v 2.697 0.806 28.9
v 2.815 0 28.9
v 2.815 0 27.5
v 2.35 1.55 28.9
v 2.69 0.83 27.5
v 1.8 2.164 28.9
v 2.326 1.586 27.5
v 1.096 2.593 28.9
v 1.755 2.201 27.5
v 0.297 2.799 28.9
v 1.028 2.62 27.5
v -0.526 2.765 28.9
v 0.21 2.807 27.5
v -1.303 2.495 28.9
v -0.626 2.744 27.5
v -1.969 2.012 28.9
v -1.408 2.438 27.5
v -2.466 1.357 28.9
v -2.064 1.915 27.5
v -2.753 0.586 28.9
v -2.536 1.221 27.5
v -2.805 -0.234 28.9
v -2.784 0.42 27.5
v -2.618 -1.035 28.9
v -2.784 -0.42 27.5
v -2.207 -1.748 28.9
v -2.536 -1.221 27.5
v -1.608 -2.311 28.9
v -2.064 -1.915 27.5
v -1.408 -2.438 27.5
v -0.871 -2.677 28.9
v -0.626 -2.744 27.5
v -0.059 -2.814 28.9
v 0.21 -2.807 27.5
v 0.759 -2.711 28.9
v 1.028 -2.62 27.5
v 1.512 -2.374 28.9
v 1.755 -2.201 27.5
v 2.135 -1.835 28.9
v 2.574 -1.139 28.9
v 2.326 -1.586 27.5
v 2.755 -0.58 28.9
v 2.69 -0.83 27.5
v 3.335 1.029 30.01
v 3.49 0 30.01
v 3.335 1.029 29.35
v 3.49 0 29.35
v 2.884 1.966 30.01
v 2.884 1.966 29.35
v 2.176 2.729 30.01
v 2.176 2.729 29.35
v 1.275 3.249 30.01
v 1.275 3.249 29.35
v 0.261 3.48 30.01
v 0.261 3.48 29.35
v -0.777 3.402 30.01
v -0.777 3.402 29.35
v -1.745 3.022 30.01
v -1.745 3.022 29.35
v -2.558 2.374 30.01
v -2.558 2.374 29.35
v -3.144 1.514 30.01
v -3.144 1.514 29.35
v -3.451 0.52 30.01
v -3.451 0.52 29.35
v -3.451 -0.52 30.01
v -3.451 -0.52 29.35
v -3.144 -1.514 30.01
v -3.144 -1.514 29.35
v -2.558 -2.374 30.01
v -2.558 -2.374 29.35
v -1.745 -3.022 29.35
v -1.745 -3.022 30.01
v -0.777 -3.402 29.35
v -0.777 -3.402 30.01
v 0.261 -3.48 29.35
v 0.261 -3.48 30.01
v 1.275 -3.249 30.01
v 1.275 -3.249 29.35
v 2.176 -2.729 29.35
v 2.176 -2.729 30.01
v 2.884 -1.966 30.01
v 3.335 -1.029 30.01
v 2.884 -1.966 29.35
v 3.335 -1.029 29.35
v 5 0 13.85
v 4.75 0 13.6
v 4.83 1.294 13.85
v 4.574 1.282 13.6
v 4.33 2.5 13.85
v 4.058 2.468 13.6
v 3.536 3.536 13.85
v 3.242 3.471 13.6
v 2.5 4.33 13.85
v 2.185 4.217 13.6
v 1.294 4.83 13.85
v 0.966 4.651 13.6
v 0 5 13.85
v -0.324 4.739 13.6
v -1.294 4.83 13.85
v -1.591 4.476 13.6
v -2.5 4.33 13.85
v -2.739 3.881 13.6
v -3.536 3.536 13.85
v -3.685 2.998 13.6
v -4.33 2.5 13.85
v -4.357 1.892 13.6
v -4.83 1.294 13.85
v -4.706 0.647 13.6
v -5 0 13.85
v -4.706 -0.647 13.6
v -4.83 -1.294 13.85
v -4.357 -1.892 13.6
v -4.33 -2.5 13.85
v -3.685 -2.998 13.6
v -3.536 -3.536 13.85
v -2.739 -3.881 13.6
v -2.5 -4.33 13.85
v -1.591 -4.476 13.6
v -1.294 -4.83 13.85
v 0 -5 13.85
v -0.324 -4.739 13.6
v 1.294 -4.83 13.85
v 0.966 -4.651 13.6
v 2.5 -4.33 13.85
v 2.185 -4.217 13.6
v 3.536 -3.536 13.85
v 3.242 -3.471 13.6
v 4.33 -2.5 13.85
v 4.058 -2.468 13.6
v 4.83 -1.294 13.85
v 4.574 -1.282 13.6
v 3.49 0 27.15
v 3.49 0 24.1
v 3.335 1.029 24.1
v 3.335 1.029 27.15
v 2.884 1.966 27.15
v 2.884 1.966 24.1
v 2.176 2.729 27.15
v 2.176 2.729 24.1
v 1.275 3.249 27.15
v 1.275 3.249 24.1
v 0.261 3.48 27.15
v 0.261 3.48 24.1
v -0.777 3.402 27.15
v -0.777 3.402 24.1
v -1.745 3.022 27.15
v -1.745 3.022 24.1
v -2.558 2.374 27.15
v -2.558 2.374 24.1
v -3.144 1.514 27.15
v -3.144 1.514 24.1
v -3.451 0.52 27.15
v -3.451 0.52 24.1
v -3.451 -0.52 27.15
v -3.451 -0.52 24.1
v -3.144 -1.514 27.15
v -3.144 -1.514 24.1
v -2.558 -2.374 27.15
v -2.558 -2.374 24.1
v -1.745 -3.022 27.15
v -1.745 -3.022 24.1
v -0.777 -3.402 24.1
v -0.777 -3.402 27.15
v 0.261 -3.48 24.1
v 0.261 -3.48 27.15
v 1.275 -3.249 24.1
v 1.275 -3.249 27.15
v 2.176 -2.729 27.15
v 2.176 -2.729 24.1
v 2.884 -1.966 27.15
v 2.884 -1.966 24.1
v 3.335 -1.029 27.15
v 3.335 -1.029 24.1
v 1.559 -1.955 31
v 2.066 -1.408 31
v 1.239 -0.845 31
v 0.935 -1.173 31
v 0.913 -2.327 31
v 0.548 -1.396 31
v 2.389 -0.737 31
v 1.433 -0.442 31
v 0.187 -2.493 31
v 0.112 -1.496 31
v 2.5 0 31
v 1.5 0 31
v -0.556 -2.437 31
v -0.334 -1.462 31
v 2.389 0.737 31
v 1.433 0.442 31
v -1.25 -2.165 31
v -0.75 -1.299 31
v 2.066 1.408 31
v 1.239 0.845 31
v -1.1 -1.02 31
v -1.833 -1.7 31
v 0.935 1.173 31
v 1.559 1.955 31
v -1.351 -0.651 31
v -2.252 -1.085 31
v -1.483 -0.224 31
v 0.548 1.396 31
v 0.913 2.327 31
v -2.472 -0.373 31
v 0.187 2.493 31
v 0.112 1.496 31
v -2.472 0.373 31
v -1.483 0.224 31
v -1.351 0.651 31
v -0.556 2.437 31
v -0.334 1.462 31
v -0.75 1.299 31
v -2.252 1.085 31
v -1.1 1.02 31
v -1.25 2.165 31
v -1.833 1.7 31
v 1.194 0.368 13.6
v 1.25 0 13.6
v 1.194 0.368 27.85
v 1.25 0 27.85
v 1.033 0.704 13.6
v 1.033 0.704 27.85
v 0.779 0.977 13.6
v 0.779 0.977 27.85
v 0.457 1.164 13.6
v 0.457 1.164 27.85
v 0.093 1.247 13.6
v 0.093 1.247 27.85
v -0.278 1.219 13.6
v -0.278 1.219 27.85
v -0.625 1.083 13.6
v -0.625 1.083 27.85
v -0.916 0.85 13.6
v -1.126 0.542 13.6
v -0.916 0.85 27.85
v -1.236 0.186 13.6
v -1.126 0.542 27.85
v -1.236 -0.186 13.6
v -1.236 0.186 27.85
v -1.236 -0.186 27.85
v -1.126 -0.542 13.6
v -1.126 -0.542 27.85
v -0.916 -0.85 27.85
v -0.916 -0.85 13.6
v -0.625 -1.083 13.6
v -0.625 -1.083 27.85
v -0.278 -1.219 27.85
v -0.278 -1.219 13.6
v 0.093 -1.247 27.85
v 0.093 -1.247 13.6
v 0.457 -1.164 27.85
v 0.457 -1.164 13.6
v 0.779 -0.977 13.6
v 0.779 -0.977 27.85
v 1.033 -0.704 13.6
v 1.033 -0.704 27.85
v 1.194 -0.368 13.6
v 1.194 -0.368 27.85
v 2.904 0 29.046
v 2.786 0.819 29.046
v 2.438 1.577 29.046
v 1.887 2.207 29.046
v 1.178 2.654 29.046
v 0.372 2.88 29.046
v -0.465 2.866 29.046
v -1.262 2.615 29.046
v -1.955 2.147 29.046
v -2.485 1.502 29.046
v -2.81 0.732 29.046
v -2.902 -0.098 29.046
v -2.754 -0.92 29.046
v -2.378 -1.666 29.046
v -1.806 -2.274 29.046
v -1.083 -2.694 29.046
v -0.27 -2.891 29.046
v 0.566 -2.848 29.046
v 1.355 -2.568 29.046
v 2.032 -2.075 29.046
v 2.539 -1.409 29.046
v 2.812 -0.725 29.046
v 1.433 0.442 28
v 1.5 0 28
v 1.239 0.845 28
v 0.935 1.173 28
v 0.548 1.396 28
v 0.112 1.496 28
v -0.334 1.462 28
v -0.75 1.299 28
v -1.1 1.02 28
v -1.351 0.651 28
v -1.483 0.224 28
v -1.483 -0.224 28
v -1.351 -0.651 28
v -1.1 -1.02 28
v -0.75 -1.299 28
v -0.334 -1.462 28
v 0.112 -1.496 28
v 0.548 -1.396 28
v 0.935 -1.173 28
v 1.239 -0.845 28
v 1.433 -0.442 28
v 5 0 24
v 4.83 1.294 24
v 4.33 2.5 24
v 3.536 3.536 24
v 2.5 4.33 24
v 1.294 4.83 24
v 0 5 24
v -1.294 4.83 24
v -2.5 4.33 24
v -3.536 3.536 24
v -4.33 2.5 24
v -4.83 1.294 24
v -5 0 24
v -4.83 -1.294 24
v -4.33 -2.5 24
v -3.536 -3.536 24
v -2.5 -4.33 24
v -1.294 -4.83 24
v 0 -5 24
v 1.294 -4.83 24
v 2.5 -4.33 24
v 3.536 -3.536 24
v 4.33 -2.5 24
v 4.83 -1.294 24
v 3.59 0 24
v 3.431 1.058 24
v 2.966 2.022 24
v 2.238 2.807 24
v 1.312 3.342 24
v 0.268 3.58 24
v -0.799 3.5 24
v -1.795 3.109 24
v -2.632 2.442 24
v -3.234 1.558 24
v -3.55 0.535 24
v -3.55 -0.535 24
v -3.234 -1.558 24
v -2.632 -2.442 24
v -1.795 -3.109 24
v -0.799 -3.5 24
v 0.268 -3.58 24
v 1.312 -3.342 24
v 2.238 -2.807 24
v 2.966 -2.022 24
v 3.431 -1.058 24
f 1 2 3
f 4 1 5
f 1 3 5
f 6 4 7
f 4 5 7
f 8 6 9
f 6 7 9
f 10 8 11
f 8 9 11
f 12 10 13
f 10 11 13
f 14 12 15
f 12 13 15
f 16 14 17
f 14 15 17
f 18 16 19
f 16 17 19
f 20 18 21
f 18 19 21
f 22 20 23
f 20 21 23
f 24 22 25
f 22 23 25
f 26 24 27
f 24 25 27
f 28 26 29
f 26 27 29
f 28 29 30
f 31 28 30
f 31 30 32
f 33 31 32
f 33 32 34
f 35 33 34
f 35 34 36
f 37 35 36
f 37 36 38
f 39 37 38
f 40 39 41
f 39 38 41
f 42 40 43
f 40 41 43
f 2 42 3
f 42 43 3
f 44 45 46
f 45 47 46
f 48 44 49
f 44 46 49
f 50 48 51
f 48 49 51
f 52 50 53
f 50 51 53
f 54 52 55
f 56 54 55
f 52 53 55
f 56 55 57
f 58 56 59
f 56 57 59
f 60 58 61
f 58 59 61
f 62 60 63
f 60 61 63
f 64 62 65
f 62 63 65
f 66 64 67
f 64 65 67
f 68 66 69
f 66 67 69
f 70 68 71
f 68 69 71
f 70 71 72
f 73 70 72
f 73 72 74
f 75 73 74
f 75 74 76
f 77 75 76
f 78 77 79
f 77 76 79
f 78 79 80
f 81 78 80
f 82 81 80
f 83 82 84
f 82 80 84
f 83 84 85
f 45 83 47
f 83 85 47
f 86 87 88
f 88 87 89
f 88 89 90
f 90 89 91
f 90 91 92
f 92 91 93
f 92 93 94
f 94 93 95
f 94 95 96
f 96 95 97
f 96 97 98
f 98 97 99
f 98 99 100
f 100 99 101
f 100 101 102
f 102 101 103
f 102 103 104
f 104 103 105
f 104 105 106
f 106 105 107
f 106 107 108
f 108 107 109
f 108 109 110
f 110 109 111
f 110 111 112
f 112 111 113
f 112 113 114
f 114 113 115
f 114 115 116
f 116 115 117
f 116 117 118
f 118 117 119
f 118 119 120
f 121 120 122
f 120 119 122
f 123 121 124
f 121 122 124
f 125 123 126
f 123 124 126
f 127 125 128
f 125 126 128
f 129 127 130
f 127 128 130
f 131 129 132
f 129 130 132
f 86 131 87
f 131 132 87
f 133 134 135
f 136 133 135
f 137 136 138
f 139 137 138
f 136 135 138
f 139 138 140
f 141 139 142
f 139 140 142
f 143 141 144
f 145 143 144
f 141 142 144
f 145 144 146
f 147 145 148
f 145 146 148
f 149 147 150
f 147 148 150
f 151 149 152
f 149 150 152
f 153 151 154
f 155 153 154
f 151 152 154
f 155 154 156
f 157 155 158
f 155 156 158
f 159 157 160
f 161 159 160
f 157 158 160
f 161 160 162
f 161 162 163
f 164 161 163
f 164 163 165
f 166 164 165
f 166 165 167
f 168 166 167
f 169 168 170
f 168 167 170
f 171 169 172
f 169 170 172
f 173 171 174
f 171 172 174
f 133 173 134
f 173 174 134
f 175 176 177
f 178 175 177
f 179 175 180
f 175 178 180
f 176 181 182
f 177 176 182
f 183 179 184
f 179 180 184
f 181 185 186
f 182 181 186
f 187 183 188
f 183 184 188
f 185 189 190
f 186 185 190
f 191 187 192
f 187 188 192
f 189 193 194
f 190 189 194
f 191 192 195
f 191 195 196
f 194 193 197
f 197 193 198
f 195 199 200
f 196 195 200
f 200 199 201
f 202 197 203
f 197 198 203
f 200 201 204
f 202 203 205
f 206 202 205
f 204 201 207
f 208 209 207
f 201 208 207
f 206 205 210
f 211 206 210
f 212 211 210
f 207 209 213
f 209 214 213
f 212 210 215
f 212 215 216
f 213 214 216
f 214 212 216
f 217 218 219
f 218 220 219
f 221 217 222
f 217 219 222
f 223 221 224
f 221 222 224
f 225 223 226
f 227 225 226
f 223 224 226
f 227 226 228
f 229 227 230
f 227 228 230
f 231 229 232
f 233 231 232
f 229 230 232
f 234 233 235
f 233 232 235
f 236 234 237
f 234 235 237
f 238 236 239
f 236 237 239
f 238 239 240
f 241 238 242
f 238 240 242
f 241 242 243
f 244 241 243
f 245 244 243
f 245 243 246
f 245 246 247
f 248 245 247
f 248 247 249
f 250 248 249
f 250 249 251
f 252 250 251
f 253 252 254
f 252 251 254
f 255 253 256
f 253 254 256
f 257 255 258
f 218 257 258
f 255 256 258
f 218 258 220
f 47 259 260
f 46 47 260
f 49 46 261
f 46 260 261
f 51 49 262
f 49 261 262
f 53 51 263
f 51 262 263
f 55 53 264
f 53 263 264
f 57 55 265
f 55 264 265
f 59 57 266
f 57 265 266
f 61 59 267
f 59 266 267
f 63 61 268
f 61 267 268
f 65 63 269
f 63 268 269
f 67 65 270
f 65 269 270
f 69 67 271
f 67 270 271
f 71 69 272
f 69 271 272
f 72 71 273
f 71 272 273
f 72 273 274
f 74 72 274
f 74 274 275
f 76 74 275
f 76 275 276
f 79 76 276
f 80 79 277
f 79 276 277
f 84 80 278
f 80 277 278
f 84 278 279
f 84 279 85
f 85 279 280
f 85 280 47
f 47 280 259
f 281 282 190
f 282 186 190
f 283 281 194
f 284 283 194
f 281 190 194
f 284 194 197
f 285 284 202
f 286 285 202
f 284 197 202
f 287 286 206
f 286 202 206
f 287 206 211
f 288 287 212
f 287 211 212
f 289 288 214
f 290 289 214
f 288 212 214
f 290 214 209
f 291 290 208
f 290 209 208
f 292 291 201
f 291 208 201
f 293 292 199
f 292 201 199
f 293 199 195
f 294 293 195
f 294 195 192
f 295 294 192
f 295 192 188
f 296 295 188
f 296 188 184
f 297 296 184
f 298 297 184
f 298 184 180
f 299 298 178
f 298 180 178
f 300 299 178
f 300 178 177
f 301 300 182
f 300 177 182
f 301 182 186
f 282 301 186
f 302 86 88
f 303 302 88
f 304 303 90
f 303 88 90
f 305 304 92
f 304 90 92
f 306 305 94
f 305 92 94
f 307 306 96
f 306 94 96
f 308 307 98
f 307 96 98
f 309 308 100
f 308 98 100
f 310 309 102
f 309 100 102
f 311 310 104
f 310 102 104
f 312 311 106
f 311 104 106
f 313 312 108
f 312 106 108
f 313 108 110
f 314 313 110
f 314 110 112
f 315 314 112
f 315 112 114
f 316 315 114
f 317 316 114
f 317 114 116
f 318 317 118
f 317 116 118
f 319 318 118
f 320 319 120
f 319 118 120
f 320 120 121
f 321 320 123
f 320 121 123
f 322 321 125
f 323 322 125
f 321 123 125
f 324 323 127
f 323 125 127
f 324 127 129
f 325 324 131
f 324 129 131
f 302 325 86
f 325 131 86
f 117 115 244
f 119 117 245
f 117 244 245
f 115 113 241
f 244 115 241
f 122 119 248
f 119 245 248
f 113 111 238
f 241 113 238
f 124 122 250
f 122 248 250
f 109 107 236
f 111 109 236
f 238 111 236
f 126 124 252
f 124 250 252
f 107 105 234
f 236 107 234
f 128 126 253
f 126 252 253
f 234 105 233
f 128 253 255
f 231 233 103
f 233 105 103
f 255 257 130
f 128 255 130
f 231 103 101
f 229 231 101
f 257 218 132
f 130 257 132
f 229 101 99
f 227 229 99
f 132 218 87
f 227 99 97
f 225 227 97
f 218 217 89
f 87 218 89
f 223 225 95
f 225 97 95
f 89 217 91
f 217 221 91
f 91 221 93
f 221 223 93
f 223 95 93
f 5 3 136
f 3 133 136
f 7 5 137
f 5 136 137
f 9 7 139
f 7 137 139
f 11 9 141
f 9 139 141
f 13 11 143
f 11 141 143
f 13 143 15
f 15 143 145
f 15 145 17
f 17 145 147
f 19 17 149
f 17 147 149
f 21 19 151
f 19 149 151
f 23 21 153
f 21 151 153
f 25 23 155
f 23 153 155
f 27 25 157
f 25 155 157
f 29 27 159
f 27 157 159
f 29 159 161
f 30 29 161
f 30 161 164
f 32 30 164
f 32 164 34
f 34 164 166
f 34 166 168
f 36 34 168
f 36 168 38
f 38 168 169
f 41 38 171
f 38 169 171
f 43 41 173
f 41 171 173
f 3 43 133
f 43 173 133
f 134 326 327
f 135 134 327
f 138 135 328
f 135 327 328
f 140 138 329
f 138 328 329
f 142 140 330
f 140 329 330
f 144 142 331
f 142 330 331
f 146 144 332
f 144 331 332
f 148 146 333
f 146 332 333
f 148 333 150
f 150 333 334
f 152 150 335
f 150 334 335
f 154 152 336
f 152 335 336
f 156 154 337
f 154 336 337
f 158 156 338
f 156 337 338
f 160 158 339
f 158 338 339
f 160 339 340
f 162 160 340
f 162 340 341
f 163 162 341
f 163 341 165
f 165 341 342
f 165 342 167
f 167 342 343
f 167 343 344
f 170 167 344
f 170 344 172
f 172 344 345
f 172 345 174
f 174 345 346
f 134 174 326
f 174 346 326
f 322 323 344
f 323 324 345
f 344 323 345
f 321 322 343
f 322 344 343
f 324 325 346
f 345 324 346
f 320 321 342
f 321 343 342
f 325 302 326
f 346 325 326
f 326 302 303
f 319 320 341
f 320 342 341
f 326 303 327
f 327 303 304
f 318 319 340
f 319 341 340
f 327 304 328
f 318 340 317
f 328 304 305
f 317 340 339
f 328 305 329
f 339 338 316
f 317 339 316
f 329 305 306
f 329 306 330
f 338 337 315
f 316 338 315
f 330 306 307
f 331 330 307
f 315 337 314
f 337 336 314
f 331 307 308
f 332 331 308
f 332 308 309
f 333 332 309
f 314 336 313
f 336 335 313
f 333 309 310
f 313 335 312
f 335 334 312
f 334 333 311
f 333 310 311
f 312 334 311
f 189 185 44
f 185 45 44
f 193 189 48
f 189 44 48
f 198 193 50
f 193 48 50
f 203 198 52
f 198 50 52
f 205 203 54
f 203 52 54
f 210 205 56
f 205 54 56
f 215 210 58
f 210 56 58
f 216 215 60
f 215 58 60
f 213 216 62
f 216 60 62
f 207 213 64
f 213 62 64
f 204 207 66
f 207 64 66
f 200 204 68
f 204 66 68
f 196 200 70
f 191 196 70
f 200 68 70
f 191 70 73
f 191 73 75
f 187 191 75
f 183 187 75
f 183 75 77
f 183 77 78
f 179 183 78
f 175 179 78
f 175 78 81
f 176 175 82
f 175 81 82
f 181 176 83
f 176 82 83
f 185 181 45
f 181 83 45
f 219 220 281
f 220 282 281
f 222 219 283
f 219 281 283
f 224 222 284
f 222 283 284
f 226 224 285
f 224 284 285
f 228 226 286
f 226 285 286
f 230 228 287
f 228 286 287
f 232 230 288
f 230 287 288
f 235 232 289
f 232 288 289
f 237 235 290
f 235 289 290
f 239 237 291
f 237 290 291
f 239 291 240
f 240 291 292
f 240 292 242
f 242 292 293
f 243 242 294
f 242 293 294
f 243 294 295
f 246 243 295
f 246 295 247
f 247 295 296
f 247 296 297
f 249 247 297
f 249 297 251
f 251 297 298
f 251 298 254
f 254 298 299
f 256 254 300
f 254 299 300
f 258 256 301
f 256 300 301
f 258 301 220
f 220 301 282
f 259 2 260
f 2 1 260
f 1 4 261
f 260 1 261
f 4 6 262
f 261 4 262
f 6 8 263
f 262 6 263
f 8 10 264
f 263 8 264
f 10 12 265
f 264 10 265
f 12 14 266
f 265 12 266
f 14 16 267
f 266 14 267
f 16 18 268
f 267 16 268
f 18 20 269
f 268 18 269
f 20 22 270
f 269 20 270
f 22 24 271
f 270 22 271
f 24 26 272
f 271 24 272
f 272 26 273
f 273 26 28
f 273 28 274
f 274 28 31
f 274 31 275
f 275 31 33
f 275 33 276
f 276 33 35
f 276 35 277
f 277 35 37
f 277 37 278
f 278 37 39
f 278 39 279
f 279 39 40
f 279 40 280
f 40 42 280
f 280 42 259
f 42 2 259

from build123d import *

# Parameters (mm, degrees)
CHAMFER_SIZE    = 0.25
CHAMFER001_SIZE = 0.1
CHAMFER002_SIZE = 0.1


with BuildPart() as part:
    # Sketch003 → Revolution003 (revolve)
    with BuildSketch(Plane.XZ):
        Polygon((2.5, 31), (3.49, 30.01), (3.49, 29.35), (2.815, 29), (2.815, 27.5), (3.49, 27.15), (3.49, 24), (5, 24), (5, 13.6), (1.25, 13.6), (1.25, 27.849785), (1.5, 28), (1.5, 31), align=None)
    revolve(axis=Axis((0, 0, 0), (0, 0, 1)))

    # Chamfer
    chamfer_edges = [part.edges().sort_by_distance(p)[0] for p in [
        (-5, 0, 13.6),
    ]]
    chamfer(chamfer_edges, length=CHAMFER_SIZE)

    # Chamfer001
    chamfer001_edges = [part.edges().sort_by_distance(p)[0] for p in [
        (-2.815, 0, 29),
    ]]
    chamfer(chamfer001_edges, length=CHAMFER001_SIZE)

    # Chamfer002
    chamfer002_edges = [part.edges().sort_by_distance(p)[0] for p in [
        (-3.49, 0, 24),
    ]]
    chamfer(chamfer002_edges, length=CHAMFER002_SIZE)


solid = part.part
